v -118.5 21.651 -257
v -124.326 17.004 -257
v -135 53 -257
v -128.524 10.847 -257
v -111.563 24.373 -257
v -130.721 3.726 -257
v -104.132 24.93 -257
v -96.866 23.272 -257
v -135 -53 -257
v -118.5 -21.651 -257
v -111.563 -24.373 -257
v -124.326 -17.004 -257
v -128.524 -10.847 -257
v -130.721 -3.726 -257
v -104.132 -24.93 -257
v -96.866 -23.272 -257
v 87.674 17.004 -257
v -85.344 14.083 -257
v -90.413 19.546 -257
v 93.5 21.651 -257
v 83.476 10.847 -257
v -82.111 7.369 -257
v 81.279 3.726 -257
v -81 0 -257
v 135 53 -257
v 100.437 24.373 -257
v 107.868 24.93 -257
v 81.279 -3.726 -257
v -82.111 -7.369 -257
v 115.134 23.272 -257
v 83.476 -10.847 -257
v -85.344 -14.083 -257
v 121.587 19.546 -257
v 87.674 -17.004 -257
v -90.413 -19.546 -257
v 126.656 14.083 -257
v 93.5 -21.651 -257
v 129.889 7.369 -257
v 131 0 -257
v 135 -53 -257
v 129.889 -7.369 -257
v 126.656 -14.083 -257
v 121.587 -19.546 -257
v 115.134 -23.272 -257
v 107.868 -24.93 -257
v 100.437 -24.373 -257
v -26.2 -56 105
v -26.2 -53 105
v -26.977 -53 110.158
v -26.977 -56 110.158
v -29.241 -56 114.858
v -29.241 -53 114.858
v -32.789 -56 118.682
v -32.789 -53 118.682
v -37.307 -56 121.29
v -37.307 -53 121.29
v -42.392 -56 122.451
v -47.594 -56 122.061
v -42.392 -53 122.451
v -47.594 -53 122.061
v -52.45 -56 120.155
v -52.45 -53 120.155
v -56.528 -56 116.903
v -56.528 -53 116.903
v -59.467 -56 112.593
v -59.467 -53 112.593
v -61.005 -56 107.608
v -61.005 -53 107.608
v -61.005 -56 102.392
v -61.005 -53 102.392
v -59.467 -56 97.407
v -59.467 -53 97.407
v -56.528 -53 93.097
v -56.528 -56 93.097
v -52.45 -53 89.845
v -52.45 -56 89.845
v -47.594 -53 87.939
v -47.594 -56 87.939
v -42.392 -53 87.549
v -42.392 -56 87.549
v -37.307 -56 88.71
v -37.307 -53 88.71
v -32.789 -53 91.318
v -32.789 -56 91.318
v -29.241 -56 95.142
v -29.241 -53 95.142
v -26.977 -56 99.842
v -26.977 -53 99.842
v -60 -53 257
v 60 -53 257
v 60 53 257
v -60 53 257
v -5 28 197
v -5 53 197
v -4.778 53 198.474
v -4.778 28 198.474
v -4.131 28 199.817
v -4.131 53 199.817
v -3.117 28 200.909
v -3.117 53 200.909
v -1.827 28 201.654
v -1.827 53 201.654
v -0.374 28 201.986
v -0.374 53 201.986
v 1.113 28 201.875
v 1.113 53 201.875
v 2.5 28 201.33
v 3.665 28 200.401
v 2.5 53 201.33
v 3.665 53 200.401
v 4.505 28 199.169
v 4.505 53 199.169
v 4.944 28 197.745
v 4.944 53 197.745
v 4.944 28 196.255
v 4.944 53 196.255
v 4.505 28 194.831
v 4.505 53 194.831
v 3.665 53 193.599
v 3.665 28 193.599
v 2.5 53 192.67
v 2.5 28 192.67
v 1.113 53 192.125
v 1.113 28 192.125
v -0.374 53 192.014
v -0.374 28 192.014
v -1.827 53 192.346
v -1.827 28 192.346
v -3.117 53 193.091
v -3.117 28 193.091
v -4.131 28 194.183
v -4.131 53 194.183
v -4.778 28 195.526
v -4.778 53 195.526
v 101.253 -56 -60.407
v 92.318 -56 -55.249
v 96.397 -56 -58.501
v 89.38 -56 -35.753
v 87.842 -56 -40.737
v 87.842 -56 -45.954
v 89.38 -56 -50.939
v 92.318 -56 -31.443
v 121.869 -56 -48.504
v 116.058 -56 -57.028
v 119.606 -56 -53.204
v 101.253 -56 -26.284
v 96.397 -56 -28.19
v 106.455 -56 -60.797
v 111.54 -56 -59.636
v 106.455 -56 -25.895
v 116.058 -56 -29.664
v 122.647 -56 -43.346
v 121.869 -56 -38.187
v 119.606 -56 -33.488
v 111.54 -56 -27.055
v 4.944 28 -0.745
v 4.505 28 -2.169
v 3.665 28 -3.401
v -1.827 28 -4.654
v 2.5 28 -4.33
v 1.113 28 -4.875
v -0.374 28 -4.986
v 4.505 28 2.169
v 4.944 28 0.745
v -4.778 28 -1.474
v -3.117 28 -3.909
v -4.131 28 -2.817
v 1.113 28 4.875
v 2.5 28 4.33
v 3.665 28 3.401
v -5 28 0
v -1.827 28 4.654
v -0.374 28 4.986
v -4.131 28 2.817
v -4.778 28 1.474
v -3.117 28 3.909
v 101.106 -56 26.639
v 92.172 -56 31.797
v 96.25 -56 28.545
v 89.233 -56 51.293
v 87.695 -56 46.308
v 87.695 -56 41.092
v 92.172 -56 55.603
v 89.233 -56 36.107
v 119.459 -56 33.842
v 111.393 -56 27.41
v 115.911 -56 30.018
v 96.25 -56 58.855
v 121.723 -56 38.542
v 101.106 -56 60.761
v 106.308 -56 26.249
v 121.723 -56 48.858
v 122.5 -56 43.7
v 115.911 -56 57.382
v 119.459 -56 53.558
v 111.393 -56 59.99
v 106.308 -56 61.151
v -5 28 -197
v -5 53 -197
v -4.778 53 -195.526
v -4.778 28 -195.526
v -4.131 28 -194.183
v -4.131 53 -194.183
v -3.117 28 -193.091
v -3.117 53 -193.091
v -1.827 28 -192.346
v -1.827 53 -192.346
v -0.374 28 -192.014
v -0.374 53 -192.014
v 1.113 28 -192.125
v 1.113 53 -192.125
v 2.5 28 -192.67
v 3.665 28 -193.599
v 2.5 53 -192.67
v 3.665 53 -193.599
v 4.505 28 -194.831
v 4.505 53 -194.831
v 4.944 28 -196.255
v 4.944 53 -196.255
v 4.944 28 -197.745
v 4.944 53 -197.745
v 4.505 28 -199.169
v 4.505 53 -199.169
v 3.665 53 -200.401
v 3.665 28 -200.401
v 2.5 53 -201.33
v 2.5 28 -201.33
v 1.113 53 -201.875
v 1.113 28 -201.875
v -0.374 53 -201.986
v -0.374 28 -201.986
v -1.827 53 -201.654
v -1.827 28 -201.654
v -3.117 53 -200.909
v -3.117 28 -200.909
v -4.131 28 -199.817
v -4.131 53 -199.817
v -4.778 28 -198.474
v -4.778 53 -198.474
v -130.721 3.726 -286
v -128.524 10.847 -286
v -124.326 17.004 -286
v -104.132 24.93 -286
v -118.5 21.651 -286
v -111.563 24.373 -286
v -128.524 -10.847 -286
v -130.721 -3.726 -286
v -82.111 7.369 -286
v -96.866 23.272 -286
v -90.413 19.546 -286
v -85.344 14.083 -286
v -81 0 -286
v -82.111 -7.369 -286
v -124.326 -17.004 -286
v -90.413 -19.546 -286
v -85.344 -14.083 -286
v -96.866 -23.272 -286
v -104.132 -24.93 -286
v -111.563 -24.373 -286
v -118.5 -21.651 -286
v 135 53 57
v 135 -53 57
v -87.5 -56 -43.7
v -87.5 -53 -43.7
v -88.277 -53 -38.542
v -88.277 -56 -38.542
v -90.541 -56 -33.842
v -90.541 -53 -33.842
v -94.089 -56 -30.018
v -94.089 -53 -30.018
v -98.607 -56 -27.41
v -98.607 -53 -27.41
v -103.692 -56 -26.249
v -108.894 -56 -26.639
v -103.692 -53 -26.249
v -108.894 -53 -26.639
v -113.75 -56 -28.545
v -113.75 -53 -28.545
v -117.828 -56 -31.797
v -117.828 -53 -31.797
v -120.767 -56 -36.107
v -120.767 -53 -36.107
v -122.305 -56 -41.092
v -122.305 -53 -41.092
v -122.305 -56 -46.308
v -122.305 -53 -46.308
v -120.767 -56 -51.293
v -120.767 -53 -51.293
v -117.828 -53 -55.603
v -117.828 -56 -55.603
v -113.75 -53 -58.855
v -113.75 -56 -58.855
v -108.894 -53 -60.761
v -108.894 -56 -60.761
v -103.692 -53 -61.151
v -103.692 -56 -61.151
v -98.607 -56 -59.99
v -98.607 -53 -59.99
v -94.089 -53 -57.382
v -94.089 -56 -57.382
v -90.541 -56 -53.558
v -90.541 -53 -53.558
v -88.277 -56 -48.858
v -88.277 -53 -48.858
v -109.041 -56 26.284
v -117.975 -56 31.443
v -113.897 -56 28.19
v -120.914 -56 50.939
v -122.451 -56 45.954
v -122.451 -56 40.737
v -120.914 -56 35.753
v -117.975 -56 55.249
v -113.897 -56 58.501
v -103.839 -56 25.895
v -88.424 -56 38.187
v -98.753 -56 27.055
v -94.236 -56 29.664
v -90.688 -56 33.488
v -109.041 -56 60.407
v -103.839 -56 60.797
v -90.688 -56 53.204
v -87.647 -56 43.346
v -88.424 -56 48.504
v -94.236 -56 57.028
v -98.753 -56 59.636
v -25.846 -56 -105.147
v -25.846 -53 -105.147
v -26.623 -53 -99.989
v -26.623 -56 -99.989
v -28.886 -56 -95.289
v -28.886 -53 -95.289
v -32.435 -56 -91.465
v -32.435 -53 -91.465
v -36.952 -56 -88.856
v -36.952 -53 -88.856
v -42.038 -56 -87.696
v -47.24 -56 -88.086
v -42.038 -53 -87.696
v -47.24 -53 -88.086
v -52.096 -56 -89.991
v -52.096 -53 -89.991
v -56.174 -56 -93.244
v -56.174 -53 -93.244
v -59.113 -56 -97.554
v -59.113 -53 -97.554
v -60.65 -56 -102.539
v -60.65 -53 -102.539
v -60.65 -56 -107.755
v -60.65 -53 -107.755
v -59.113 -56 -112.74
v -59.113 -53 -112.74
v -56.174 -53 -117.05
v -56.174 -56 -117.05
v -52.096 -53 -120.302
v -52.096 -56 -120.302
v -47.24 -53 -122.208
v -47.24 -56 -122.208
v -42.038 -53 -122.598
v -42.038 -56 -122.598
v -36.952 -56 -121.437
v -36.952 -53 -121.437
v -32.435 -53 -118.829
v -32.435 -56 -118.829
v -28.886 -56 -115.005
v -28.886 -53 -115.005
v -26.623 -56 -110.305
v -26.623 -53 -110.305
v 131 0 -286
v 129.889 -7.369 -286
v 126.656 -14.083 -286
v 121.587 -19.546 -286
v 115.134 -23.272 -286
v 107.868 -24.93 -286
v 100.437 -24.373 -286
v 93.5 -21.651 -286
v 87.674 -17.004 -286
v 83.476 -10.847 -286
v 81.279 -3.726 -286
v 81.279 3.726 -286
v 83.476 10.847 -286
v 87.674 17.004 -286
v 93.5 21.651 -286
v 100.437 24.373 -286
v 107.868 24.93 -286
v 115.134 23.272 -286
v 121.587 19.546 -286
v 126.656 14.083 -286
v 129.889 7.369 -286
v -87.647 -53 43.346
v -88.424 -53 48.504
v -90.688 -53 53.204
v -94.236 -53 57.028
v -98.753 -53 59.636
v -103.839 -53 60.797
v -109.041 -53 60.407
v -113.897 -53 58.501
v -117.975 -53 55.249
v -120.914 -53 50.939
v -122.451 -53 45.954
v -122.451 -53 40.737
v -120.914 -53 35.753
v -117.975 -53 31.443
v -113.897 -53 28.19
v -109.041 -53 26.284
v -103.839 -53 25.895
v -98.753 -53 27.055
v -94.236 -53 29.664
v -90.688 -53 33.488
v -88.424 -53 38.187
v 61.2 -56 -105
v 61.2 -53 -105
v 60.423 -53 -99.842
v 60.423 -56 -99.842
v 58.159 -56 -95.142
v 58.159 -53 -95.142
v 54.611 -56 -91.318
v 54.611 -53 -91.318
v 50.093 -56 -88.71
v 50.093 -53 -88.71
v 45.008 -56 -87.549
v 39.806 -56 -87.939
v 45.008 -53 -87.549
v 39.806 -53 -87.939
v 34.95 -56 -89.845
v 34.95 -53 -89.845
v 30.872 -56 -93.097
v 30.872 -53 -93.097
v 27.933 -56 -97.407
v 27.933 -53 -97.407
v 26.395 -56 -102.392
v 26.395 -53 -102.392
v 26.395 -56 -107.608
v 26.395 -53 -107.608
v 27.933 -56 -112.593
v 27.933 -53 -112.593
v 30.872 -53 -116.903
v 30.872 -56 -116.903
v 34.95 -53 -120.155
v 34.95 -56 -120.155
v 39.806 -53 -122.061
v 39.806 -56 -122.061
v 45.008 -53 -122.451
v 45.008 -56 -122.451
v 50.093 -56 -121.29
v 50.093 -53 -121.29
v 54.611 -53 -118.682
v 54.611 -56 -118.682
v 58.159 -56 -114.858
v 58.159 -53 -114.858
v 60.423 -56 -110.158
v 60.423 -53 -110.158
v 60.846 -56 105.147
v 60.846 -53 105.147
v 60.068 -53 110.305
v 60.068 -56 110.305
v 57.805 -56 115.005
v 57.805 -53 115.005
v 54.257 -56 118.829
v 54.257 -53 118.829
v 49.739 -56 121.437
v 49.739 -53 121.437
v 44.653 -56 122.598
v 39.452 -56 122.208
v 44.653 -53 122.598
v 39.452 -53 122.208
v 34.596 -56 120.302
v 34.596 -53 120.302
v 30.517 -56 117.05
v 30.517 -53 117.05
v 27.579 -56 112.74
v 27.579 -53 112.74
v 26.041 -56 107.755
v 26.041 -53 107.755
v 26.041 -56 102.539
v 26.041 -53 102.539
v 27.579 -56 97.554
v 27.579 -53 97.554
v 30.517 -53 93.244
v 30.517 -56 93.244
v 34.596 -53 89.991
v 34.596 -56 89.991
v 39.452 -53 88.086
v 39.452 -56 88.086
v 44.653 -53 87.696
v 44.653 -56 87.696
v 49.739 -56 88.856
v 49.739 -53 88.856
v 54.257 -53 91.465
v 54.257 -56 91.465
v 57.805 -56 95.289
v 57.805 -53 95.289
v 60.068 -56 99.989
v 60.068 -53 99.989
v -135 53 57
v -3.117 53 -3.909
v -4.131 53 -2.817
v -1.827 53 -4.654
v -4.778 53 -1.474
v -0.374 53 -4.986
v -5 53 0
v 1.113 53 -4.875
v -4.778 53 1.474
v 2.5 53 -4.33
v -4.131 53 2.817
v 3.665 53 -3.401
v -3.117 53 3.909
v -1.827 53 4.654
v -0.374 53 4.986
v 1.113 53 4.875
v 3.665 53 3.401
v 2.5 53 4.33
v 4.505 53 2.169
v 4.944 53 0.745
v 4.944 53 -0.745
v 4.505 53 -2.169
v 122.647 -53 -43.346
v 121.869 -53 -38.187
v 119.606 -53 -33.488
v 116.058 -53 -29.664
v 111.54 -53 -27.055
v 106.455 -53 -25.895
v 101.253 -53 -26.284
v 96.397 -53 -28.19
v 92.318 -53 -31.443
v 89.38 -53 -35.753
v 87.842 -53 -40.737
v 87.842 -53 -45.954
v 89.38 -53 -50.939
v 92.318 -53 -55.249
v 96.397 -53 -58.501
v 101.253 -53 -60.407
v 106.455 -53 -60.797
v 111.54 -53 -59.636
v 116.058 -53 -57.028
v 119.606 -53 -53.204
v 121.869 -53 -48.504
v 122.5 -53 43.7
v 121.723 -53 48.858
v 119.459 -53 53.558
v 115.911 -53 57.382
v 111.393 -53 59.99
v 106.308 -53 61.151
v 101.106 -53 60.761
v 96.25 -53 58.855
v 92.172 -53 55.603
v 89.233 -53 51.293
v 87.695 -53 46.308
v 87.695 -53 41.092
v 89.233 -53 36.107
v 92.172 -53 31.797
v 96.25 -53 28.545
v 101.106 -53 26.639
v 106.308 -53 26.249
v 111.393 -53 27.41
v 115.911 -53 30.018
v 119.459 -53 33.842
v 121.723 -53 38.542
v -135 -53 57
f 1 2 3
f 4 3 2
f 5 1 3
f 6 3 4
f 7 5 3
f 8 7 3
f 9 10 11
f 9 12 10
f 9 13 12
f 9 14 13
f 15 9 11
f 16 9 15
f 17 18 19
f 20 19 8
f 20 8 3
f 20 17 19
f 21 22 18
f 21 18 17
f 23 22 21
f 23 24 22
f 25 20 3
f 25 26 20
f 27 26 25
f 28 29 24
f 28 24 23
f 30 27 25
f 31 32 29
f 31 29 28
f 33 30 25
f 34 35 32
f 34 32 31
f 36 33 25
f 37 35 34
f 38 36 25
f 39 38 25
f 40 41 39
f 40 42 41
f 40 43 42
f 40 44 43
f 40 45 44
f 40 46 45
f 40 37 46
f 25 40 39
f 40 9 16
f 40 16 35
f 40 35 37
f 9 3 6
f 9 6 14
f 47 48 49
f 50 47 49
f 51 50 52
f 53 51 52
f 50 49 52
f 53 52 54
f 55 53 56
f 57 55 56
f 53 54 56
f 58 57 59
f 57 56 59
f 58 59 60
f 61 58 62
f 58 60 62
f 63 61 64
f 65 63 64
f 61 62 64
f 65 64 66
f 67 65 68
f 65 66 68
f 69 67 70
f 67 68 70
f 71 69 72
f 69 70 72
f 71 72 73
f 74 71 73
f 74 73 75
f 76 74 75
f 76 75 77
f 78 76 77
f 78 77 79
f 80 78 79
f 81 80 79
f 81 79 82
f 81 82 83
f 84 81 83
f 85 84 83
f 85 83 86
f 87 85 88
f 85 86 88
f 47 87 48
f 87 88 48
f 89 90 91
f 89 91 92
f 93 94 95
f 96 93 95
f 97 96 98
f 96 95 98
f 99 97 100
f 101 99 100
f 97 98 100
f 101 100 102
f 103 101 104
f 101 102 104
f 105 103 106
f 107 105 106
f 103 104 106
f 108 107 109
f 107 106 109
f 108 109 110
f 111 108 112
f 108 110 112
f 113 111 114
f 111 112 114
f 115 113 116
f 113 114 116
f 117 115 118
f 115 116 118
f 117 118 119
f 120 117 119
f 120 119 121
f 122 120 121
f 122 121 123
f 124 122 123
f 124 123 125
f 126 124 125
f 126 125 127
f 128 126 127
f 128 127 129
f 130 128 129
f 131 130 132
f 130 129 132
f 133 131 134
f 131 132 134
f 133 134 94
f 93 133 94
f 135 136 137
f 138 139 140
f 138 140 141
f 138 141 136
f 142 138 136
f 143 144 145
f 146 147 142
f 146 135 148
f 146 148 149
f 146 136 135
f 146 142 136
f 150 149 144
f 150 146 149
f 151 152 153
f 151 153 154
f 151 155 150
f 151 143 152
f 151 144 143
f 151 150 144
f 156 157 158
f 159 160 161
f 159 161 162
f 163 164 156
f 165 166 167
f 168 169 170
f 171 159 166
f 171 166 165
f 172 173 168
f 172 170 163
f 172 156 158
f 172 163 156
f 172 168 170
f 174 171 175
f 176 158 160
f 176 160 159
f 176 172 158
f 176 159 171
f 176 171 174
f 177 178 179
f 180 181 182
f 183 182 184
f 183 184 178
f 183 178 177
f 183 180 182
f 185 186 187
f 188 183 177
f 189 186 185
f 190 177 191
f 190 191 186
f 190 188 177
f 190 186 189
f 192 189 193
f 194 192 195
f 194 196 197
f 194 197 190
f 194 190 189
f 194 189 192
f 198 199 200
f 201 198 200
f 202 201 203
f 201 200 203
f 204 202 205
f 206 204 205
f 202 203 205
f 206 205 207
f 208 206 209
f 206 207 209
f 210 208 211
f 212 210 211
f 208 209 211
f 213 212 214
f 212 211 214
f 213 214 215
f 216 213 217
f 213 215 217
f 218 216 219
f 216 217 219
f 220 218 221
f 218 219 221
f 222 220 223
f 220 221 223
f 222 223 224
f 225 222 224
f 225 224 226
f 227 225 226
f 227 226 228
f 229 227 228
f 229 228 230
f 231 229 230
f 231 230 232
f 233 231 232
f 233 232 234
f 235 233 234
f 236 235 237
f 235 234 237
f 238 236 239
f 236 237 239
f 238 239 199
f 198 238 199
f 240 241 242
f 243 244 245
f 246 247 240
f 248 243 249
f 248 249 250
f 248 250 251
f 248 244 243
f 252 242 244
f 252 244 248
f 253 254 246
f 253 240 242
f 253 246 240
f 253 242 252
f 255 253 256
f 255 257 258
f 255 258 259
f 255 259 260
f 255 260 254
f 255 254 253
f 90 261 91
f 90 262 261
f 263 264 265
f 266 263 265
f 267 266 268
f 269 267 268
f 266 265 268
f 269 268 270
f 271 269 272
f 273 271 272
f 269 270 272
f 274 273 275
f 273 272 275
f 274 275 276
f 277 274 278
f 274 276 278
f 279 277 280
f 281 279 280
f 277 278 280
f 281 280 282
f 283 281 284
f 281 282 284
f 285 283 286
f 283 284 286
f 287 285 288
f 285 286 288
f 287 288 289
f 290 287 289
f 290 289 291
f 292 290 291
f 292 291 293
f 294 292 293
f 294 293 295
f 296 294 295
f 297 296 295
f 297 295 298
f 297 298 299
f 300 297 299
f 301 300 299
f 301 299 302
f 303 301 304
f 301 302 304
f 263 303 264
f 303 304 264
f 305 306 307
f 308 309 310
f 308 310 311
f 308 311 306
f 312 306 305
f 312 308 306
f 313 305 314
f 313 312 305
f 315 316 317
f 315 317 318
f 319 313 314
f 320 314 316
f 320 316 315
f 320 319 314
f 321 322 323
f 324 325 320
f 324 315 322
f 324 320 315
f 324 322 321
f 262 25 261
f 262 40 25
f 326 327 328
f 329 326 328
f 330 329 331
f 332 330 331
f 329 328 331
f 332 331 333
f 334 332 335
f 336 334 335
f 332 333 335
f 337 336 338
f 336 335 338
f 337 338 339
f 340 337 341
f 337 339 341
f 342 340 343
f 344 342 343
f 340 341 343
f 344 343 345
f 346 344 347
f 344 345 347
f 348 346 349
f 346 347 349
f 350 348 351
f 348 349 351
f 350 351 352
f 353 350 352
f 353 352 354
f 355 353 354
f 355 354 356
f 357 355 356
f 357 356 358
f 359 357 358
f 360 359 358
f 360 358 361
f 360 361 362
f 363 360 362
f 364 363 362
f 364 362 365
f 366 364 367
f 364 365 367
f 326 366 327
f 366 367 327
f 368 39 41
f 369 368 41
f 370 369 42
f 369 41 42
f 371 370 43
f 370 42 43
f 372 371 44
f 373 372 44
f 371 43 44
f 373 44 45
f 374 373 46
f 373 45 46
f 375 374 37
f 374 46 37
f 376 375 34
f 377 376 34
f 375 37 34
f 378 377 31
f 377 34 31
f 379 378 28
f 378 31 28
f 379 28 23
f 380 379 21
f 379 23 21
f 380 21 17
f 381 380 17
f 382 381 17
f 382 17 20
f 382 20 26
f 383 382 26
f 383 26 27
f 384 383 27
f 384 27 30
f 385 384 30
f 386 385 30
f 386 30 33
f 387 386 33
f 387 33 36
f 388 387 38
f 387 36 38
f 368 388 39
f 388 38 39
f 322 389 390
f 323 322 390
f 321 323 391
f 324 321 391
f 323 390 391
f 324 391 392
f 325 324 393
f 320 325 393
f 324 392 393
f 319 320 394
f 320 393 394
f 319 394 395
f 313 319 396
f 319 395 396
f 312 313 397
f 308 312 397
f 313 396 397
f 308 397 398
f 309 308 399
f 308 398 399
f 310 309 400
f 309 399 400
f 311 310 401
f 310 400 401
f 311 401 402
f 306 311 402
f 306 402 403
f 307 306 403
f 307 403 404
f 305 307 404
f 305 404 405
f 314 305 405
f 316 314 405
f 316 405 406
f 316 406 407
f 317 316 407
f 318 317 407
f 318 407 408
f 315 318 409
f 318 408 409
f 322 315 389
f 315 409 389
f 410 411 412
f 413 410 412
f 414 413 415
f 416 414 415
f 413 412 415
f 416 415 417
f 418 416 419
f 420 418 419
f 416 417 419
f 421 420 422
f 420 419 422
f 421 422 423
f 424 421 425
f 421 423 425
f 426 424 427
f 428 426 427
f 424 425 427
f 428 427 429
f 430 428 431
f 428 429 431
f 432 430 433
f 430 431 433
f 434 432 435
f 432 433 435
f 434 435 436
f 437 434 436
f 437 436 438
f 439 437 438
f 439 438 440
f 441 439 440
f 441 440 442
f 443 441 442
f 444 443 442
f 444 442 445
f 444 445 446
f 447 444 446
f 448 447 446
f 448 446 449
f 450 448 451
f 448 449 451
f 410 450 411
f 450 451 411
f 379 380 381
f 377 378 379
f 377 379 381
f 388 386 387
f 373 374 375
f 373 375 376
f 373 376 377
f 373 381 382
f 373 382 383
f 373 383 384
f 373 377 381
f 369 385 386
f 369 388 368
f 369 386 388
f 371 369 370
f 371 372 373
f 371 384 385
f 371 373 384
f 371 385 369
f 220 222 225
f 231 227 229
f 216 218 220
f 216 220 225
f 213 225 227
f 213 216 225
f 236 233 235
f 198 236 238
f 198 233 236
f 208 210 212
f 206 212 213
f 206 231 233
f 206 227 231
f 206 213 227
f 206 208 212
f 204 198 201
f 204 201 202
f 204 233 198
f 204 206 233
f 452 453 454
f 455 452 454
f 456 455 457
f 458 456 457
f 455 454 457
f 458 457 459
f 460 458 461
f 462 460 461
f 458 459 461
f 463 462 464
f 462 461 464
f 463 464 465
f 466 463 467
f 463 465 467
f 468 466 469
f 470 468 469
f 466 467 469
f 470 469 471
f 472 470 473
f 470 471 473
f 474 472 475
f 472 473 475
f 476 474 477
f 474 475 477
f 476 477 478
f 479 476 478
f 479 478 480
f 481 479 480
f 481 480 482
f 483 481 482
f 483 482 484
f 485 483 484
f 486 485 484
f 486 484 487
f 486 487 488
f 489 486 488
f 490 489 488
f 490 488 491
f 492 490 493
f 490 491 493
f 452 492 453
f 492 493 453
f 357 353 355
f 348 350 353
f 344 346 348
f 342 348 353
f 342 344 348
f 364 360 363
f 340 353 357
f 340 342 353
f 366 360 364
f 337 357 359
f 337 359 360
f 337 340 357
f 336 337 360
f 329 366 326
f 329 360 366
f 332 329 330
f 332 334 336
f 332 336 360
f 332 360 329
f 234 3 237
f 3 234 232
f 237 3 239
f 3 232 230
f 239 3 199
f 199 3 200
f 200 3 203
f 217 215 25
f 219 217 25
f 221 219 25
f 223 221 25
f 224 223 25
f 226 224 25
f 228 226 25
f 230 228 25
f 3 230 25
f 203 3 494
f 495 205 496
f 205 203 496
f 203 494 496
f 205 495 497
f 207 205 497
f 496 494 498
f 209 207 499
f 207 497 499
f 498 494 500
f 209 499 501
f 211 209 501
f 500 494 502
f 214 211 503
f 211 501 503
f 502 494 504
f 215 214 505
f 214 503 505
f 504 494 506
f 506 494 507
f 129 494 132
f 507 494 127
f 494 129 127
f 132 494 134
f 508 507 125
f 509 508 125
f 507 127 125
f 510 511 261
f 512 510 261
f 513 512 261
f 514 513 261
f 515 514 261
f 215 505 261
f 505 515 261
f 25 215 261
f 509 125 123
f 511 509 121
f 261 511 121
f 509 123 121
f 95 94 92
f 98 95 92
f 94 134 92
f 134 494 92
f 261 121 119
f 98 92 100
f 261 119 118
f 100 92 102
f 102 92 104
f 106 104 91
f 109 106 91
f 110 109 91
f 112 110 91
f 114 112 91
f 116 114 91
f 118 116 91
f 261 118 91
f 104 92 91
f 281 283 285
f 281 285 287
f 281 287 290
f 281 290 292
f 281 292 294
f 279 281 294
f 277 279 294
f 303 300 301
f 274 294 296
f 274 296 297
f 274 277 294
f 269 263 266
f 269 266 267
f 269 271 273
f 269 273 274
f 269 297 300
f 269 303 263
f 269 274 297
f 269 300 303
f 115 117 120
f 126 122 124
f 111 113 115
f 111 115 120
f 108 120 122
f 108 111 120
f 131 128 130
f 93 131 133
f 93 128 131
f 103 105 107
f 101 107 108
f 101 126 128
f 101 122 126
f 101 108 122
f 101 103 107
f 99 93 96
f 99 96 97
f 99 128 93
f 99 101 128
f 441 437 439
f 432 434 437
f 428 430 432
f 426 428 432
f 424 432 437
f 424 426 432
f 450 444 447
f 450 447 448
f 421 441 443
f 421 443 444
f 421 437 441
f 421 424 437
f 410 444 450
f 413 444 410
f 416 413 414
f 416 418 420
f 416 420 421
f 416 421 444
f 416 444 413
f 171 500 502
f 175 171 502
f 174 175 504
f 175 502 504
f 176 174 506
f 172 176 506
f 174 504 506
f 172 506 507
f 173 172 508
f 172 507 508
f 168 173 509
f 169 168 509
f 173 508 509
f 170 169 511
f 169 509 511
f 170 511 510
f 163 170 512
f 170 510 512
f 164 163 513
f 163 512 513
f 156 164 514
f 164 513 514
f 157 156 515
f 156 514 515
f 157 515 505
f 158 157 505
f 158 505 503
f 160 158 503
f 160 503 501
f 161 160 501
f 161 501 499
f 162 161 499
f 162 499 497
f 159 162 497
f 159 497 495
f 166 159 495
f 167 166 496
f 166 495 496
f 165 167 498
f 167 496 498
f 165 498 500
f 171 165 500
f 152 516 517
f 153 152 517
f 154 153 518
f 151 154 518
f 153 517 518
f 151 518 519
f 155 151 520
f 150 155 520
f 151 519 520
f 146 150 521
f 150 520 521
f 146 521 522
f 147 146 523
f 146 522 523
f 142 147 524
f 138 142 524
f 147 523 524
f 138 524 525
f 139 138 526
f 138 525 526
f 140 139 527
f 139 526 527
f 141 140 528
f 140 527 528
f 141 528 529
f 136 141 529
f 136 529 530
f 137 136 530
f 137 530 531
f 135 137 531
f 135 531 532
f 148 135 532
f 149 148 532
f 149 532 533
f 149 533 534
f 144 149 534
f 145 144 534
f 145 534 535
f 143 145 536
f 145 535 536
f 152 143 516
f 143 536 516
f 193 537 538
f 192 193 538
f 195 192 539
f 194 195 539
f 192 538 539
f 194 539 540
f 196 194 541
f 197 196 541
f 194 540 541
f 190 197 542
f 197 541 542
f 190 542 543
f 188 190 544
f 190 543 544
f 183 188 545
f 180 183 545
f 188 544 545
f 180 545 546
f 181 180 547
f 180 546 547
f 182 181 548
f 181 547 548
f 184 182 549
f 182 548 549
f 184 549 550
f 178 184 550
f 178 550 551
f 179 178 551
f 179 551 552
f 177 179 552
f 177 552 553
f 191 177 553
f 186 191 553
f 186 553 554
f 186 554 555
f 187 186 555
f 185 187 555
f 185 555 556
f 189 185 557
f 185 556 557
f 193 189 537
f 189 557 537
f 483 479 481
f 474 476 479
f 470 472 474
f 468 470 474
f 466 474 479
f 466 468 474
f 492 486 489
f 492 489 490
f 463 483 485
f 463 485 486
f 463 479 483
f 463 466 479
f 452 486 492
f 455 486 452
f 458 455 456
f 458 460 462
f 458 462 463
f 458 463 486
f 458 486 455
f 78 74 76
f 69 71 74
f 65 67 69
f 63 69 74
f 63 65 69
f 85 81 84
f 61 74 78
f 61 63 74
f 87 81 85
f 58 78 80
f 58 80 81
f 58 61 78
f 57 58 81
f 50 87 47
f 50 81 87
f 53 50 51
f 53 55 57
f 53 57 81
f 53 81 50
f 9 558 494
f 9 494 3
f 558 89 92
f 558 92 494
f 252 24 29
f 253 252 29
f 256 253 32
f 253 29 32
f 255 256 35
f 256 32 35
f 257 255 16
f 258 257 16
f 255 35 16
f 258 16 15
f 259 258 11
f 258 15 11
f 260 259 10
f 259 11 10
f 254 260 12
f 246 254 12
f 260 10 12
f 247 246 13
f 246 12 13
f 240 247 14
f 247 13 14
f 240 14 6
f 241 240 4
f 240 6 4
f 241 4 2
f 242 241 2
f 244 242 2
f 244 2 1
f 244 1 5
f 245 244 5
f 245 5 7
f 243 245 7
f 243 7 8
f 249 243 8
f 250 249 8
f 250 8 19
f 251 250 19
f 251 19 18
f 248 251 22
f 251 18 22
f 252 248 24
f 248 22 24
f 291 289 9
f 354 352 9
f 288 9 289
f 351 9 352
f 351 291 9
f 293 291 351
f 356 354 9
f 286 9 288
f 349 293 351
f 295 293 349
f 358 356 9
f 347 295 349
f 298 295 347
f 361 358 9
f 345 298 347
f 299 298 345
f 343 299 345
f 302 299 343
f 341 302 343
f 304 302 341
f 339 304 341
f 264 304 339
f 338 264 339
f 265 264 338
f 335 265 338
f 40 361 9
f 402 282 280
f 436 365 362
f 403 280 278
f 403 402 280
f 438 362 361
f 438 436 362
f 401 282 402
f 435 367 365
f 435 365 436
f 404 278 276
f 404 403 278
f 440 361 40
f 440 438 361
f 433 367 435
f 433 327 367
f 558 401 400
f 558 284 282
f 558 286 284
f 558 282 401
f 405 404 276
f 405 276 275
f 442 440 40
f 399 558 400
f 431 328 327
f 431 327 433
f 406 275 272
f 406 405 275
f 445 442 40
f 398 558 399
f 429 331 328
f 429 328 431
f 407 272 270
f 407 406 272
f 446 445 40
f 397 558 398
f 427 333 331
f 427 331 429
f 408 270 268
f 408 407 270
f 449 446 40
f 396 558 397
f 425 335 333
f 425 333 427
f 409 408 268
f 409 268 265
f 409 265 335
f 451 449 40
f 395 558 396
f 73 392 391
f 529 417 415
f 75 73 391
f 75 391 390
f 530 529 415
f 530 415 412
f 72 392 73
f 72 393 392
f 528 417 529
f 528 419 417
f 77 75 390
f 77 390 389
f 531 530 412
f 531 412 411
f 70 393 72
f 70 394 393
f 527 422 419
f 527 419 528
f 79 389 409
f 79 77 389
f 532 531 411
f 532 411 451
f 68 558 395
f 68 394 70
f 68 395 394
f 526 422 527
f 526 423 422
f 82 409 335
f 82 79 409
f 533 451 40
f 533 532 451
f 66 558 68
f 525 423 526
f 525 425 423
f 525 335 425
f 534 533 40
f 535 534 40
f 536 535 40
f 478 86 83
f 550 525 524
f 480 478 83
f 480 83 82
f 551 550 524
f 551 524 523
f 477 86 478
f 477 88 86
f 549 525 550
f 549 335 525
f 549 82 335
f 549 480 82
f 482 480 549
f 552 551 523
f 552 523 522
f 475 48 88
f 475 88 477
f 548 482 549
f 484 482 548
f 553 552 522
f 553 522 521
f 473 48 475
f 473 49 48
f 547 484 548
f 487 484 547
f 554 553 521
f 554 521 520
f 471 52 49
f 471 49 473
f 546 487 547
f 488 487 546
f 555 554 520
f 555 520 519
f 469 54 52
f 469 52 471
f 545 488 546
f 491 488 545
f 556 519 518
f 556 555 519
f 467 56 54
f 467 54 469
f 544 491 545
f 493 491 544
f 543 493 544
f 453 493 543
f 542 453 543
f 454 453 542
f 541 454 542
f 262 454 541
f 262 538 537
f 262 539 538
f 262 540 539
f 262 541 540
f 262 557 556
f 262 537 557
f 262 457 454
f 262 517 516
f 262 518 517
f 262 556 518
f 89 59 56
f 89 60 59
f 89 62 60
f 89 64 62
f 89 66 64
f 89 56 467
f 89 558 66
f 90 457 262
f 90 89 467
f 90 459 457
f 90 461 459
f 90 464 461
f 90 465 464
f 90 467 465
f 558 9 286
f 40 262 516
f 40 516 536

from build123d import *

# Parameters (mm, degrees)
F1_DEPTH = 53
F2_R     = 17.5
F3_DEPTH = 3
F4_R     = 5
F5_DEPTH = 25
F6_R     = 25
F7_DEPTH = 29


with BuildPart() as f1:
    # F0 (on Front) → F1 (new body, symmetric)
    with BuildSketch(Plane.XZ):
        Polygon((135, 57), (60, 257), (-60, 257), (-135, 57), (-135, -257), (135, -257), align=None)
    extrude(amount=F1_DEPTH, both=True)

    # F2 (on face) → F3 (join)
    with BuildSketch(Plane.XZ.offset(53)):
        with Locations((105, 43.7)):
            Circle(F2_R)
        with Locations((43.345646, 105.146778)):
            Circle(F2_R)
        with Locations((-43.7, 105)):
            Circle(F2_R)
        with Locations((-105.146778, 43.345646)):
            Circle(F2_R)
        with Locations((-105, -43.7)):
            Circle(F2_R)
        with Locations((-43.345646, -105.146778)):
            Circle(F2_R)
        with Locations((43.7, -105)):
            Circle(F2_R)
        with Locations((105.146778, -43.345646)):
            Circle(F2_R)
    extrude(amount=F3_DEPTH)

    # F4 (on face) → F5 (cut)
    with BuildSketch(Plane(origin=(0, 53, 0), x_dir=(-1, 0, 0), z_dir=(0, 1, 0))):
        Circle(F4_R)
        with Locations((0, 197)):
            Circle(F4_R)
        with Locations((0, -197)):
            Circle(F4_R)
    extrude(amount=-F5_DEPTH, mode=Mode.SUBTRACT)

    # F6 (on face) → F7 (join)
    with BuildSketch(Plane(origin=(0, 0, -257), x_dir=(1, 0, 0), z_dir=(0, 0, -1))):
        with Locations((106, 0)):
            Circle(F6_R)
        with Locations((-106, 0)):
            Circle(F6_R)
    extrude(amount=F7_DEPTH)


solid = f1.part
